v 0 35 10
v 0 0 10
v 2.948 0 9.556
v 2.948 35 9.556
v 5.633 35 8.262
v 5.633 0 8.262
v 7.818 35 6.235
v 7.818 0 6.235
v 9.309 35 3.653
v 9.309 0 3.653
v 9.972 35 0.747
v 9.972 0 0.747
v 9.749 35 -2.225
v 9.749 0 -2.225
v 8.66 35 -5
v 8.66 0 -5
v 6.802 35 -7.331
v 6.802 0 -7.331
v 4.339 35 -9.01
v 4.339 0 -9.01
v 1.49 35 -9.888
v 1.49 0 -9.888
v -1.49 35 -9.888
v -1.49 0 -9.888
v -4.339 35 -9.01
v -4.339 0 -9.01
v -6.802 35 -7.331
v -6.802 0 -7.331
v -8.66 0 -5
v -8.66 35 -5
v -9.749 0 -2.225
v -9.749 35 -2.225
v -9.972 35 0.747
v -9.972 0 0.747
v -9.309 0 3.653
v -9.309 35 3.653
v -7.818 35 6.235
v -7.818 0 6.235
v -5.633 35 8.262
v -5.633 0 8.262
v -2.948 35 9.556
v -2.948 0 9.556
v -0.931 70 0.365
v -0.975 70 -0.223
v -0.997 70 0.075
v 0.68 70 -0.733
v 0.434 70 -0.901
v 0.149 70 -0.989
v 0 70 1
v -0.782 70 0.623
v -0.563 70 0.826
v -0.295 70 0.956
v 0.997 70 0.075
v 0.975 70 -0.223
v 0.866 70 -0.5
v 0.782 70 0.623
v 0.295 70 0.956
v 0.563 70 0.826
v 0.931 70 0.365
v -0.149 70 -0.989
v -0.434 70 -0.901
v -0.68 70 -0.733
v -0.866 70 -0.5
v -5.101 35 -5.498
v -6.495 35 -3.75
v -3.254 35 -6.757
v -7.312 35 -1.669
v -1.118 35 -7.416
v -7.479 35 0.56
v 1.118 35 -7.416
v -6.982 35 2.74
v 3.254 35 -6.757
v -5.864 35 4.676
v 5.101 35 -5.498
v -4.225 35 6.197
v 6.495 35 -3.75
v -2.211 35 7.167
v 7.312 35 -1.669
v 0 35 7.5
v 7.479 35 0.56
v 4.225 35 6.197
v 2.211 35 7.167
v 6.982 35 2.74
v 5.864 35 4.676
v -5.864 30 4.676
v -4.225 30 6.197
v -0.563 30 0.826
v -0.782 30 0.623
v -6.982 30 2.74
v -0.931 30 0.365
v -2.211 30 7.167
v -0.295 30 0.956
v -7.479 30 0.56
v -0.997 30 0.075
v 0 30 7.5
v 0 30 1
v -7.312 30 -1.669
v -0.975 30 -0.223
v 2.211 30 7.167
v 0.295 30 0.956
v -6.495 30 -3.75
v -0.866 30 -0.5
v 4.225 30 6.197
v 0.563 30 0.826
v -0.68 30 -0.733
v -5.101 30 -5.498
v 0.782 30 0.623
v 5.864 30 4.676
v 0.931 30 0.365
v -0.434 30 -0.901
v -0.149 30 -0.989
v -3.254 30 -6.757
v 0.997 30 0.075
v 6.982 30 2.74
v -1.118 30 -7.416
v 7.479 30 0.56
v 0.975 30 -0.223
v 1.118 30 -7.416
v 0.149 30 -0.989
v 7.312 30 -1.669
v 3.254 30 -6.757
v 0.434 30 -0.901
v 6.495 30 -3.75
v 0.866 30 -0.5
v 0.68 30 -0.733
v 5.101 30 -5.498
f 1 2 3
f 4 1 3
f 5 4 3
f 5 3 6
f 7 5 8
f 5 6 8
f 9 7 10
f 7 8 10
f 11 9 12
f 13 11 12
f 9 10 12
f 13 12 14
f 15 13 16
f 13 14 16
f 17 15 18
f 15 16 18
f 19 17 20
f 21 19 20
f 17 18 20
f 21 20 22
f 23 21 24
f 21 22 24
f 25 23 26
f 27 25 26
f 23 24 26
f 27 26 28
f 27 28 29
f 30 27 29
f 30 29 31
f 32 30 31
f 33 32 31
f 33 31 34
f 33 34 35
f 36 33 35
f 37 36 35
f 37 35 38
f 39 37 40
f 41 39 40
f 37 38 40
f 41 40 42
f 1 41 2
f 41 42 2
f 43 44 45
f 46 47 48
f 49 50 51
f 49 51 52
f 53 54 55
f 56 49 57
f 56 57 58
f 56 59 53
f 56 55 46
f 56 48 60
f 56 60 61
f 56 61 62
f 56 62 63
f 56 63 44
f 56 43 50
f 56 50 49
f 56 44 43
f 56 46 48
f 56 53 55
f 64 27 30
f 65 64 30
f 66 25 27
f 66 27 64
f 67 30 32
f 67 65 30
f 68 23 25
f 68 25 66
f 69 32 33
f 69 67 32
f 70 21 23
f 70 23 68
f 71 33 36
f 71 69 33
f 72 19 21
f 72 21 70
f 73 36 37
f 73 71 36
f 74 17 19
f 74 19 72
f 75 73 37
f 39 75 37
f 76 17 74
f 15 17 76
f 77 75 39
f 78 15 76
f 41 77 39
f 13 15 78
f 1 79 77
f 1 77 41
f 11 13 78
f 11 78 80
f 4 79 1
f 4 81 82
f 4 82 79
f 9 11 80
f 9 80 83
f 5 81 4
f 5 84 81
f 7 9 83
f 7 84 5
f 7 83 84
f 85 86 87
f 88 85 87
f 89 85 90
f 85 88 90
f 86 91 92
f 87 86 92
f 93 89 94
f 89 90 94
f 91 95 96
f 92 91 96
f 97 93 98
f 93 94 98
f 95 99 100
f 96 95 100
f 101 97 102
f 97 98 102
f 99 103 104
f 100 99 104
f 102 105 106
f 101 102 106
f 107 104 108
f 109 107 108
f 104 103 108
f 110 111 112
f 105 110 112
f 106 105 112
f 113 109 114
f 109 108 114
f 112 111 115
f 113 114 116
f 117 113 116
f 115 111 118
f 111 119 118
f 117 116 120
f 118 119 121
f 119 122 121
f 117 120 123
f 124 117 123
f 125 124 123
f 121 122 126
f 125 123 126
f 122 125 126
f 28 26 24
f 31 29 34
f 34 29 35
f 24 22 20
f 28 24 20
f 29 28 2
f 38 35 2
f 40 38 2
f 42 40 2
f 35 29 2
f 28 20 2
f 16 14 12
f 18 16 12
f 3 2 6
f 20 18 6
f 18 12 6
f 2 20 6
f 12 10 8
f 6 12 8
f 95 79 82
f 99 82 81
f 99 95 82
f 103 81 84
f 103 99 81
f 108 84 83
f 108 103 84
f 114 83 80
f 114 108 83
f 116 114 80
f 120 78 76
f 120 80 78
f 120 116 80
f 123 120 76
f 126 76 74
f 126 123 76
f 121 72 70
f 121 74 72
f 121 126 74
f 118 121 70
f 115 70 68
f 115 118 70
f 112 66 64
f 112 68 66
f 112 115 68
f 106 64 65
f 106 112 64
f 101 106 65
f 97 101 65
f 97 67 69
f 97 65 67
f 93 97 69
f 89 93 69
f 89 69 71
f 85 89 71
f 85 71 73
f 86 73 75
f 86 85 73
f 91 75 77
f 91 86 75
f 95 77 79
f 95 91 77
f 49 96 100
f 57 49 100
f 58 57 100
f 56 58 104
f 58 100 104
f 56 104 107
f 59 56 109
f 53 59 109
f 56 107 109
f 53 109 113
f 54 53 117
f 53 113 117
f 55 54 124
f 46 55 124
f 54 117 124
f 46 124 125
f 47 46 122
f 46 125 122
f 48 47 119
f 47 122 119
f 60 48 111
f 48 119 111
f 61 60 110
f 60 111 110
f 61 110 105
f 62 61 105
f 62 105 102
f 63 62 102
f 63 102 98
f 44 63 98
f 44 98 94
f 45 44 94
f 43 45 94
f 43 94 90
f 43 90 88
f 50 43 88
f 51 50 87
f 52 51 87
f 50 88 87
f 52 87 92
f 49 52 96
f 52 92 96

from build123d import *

# Parameters (mm, degrees)
SKETCH1_R                 = 10
BOSS_EXTRUDE2_DEPTH       = 35
SHELL1_T                  = -2.5
SHELL1_THICKNESS_2_FACE_R = 7.5
SHELL1_THICKNESS_2_DEPTH  = 27.5
SKETCH2_R                 = 1
BOSS_EXTRUDE3_DEPTH       = 40


with BuildPart() as part:
    # Sketch1 → Boss-Extrude2 (new body)
    with BuildSketch(Plane(origin=(0, 0, 0), x_dir=(1, 0, 0), z_dir=(0, 1, 0))):
        with Locations(Location((0, 0, 0), (0, 0, 270))):
            Circle(SKETCH1_R)
    extrude(amount=BOSS_EXTRUDE2_DEPTH)

    # Shell1
    shell1_openings = [part.faces().sort_by_distance(p)[0] for p in [
        (0, 35, 0),
    ]]
    offset(amount=SHELL1_T, openings=shell1_openings, kind=Kind.INTERSECTION)

    # Shell1 thickness 2 face (on inner face of the shell) → Shell1 thickness 2 (add)
    with BuildSketch(Plane(origin=(0, 2.5, 0), x_dir=(0, 0, -1), z_dir=(0, -1, 0))):
        Circle(SHELL1_THICKNESS_2_FACE_R)
    extrude(amount=-SHELL1_THICKNESS_2_DEPTH)

    # Sketch2 → Boss-Extrude3 (add)
    with BuildSketch(Plane(origin=(0, 30, 0), x_dir=(1, 0, 0), z_dir=(0, 1, 0))):
        with Locations(Location((0, 0, 0), (0, 0, 270))):
            Circle(SKETCH2_R)
    extrude(amount=BOSS_EXTRUDE3_DEPTH)


solid = part.part
